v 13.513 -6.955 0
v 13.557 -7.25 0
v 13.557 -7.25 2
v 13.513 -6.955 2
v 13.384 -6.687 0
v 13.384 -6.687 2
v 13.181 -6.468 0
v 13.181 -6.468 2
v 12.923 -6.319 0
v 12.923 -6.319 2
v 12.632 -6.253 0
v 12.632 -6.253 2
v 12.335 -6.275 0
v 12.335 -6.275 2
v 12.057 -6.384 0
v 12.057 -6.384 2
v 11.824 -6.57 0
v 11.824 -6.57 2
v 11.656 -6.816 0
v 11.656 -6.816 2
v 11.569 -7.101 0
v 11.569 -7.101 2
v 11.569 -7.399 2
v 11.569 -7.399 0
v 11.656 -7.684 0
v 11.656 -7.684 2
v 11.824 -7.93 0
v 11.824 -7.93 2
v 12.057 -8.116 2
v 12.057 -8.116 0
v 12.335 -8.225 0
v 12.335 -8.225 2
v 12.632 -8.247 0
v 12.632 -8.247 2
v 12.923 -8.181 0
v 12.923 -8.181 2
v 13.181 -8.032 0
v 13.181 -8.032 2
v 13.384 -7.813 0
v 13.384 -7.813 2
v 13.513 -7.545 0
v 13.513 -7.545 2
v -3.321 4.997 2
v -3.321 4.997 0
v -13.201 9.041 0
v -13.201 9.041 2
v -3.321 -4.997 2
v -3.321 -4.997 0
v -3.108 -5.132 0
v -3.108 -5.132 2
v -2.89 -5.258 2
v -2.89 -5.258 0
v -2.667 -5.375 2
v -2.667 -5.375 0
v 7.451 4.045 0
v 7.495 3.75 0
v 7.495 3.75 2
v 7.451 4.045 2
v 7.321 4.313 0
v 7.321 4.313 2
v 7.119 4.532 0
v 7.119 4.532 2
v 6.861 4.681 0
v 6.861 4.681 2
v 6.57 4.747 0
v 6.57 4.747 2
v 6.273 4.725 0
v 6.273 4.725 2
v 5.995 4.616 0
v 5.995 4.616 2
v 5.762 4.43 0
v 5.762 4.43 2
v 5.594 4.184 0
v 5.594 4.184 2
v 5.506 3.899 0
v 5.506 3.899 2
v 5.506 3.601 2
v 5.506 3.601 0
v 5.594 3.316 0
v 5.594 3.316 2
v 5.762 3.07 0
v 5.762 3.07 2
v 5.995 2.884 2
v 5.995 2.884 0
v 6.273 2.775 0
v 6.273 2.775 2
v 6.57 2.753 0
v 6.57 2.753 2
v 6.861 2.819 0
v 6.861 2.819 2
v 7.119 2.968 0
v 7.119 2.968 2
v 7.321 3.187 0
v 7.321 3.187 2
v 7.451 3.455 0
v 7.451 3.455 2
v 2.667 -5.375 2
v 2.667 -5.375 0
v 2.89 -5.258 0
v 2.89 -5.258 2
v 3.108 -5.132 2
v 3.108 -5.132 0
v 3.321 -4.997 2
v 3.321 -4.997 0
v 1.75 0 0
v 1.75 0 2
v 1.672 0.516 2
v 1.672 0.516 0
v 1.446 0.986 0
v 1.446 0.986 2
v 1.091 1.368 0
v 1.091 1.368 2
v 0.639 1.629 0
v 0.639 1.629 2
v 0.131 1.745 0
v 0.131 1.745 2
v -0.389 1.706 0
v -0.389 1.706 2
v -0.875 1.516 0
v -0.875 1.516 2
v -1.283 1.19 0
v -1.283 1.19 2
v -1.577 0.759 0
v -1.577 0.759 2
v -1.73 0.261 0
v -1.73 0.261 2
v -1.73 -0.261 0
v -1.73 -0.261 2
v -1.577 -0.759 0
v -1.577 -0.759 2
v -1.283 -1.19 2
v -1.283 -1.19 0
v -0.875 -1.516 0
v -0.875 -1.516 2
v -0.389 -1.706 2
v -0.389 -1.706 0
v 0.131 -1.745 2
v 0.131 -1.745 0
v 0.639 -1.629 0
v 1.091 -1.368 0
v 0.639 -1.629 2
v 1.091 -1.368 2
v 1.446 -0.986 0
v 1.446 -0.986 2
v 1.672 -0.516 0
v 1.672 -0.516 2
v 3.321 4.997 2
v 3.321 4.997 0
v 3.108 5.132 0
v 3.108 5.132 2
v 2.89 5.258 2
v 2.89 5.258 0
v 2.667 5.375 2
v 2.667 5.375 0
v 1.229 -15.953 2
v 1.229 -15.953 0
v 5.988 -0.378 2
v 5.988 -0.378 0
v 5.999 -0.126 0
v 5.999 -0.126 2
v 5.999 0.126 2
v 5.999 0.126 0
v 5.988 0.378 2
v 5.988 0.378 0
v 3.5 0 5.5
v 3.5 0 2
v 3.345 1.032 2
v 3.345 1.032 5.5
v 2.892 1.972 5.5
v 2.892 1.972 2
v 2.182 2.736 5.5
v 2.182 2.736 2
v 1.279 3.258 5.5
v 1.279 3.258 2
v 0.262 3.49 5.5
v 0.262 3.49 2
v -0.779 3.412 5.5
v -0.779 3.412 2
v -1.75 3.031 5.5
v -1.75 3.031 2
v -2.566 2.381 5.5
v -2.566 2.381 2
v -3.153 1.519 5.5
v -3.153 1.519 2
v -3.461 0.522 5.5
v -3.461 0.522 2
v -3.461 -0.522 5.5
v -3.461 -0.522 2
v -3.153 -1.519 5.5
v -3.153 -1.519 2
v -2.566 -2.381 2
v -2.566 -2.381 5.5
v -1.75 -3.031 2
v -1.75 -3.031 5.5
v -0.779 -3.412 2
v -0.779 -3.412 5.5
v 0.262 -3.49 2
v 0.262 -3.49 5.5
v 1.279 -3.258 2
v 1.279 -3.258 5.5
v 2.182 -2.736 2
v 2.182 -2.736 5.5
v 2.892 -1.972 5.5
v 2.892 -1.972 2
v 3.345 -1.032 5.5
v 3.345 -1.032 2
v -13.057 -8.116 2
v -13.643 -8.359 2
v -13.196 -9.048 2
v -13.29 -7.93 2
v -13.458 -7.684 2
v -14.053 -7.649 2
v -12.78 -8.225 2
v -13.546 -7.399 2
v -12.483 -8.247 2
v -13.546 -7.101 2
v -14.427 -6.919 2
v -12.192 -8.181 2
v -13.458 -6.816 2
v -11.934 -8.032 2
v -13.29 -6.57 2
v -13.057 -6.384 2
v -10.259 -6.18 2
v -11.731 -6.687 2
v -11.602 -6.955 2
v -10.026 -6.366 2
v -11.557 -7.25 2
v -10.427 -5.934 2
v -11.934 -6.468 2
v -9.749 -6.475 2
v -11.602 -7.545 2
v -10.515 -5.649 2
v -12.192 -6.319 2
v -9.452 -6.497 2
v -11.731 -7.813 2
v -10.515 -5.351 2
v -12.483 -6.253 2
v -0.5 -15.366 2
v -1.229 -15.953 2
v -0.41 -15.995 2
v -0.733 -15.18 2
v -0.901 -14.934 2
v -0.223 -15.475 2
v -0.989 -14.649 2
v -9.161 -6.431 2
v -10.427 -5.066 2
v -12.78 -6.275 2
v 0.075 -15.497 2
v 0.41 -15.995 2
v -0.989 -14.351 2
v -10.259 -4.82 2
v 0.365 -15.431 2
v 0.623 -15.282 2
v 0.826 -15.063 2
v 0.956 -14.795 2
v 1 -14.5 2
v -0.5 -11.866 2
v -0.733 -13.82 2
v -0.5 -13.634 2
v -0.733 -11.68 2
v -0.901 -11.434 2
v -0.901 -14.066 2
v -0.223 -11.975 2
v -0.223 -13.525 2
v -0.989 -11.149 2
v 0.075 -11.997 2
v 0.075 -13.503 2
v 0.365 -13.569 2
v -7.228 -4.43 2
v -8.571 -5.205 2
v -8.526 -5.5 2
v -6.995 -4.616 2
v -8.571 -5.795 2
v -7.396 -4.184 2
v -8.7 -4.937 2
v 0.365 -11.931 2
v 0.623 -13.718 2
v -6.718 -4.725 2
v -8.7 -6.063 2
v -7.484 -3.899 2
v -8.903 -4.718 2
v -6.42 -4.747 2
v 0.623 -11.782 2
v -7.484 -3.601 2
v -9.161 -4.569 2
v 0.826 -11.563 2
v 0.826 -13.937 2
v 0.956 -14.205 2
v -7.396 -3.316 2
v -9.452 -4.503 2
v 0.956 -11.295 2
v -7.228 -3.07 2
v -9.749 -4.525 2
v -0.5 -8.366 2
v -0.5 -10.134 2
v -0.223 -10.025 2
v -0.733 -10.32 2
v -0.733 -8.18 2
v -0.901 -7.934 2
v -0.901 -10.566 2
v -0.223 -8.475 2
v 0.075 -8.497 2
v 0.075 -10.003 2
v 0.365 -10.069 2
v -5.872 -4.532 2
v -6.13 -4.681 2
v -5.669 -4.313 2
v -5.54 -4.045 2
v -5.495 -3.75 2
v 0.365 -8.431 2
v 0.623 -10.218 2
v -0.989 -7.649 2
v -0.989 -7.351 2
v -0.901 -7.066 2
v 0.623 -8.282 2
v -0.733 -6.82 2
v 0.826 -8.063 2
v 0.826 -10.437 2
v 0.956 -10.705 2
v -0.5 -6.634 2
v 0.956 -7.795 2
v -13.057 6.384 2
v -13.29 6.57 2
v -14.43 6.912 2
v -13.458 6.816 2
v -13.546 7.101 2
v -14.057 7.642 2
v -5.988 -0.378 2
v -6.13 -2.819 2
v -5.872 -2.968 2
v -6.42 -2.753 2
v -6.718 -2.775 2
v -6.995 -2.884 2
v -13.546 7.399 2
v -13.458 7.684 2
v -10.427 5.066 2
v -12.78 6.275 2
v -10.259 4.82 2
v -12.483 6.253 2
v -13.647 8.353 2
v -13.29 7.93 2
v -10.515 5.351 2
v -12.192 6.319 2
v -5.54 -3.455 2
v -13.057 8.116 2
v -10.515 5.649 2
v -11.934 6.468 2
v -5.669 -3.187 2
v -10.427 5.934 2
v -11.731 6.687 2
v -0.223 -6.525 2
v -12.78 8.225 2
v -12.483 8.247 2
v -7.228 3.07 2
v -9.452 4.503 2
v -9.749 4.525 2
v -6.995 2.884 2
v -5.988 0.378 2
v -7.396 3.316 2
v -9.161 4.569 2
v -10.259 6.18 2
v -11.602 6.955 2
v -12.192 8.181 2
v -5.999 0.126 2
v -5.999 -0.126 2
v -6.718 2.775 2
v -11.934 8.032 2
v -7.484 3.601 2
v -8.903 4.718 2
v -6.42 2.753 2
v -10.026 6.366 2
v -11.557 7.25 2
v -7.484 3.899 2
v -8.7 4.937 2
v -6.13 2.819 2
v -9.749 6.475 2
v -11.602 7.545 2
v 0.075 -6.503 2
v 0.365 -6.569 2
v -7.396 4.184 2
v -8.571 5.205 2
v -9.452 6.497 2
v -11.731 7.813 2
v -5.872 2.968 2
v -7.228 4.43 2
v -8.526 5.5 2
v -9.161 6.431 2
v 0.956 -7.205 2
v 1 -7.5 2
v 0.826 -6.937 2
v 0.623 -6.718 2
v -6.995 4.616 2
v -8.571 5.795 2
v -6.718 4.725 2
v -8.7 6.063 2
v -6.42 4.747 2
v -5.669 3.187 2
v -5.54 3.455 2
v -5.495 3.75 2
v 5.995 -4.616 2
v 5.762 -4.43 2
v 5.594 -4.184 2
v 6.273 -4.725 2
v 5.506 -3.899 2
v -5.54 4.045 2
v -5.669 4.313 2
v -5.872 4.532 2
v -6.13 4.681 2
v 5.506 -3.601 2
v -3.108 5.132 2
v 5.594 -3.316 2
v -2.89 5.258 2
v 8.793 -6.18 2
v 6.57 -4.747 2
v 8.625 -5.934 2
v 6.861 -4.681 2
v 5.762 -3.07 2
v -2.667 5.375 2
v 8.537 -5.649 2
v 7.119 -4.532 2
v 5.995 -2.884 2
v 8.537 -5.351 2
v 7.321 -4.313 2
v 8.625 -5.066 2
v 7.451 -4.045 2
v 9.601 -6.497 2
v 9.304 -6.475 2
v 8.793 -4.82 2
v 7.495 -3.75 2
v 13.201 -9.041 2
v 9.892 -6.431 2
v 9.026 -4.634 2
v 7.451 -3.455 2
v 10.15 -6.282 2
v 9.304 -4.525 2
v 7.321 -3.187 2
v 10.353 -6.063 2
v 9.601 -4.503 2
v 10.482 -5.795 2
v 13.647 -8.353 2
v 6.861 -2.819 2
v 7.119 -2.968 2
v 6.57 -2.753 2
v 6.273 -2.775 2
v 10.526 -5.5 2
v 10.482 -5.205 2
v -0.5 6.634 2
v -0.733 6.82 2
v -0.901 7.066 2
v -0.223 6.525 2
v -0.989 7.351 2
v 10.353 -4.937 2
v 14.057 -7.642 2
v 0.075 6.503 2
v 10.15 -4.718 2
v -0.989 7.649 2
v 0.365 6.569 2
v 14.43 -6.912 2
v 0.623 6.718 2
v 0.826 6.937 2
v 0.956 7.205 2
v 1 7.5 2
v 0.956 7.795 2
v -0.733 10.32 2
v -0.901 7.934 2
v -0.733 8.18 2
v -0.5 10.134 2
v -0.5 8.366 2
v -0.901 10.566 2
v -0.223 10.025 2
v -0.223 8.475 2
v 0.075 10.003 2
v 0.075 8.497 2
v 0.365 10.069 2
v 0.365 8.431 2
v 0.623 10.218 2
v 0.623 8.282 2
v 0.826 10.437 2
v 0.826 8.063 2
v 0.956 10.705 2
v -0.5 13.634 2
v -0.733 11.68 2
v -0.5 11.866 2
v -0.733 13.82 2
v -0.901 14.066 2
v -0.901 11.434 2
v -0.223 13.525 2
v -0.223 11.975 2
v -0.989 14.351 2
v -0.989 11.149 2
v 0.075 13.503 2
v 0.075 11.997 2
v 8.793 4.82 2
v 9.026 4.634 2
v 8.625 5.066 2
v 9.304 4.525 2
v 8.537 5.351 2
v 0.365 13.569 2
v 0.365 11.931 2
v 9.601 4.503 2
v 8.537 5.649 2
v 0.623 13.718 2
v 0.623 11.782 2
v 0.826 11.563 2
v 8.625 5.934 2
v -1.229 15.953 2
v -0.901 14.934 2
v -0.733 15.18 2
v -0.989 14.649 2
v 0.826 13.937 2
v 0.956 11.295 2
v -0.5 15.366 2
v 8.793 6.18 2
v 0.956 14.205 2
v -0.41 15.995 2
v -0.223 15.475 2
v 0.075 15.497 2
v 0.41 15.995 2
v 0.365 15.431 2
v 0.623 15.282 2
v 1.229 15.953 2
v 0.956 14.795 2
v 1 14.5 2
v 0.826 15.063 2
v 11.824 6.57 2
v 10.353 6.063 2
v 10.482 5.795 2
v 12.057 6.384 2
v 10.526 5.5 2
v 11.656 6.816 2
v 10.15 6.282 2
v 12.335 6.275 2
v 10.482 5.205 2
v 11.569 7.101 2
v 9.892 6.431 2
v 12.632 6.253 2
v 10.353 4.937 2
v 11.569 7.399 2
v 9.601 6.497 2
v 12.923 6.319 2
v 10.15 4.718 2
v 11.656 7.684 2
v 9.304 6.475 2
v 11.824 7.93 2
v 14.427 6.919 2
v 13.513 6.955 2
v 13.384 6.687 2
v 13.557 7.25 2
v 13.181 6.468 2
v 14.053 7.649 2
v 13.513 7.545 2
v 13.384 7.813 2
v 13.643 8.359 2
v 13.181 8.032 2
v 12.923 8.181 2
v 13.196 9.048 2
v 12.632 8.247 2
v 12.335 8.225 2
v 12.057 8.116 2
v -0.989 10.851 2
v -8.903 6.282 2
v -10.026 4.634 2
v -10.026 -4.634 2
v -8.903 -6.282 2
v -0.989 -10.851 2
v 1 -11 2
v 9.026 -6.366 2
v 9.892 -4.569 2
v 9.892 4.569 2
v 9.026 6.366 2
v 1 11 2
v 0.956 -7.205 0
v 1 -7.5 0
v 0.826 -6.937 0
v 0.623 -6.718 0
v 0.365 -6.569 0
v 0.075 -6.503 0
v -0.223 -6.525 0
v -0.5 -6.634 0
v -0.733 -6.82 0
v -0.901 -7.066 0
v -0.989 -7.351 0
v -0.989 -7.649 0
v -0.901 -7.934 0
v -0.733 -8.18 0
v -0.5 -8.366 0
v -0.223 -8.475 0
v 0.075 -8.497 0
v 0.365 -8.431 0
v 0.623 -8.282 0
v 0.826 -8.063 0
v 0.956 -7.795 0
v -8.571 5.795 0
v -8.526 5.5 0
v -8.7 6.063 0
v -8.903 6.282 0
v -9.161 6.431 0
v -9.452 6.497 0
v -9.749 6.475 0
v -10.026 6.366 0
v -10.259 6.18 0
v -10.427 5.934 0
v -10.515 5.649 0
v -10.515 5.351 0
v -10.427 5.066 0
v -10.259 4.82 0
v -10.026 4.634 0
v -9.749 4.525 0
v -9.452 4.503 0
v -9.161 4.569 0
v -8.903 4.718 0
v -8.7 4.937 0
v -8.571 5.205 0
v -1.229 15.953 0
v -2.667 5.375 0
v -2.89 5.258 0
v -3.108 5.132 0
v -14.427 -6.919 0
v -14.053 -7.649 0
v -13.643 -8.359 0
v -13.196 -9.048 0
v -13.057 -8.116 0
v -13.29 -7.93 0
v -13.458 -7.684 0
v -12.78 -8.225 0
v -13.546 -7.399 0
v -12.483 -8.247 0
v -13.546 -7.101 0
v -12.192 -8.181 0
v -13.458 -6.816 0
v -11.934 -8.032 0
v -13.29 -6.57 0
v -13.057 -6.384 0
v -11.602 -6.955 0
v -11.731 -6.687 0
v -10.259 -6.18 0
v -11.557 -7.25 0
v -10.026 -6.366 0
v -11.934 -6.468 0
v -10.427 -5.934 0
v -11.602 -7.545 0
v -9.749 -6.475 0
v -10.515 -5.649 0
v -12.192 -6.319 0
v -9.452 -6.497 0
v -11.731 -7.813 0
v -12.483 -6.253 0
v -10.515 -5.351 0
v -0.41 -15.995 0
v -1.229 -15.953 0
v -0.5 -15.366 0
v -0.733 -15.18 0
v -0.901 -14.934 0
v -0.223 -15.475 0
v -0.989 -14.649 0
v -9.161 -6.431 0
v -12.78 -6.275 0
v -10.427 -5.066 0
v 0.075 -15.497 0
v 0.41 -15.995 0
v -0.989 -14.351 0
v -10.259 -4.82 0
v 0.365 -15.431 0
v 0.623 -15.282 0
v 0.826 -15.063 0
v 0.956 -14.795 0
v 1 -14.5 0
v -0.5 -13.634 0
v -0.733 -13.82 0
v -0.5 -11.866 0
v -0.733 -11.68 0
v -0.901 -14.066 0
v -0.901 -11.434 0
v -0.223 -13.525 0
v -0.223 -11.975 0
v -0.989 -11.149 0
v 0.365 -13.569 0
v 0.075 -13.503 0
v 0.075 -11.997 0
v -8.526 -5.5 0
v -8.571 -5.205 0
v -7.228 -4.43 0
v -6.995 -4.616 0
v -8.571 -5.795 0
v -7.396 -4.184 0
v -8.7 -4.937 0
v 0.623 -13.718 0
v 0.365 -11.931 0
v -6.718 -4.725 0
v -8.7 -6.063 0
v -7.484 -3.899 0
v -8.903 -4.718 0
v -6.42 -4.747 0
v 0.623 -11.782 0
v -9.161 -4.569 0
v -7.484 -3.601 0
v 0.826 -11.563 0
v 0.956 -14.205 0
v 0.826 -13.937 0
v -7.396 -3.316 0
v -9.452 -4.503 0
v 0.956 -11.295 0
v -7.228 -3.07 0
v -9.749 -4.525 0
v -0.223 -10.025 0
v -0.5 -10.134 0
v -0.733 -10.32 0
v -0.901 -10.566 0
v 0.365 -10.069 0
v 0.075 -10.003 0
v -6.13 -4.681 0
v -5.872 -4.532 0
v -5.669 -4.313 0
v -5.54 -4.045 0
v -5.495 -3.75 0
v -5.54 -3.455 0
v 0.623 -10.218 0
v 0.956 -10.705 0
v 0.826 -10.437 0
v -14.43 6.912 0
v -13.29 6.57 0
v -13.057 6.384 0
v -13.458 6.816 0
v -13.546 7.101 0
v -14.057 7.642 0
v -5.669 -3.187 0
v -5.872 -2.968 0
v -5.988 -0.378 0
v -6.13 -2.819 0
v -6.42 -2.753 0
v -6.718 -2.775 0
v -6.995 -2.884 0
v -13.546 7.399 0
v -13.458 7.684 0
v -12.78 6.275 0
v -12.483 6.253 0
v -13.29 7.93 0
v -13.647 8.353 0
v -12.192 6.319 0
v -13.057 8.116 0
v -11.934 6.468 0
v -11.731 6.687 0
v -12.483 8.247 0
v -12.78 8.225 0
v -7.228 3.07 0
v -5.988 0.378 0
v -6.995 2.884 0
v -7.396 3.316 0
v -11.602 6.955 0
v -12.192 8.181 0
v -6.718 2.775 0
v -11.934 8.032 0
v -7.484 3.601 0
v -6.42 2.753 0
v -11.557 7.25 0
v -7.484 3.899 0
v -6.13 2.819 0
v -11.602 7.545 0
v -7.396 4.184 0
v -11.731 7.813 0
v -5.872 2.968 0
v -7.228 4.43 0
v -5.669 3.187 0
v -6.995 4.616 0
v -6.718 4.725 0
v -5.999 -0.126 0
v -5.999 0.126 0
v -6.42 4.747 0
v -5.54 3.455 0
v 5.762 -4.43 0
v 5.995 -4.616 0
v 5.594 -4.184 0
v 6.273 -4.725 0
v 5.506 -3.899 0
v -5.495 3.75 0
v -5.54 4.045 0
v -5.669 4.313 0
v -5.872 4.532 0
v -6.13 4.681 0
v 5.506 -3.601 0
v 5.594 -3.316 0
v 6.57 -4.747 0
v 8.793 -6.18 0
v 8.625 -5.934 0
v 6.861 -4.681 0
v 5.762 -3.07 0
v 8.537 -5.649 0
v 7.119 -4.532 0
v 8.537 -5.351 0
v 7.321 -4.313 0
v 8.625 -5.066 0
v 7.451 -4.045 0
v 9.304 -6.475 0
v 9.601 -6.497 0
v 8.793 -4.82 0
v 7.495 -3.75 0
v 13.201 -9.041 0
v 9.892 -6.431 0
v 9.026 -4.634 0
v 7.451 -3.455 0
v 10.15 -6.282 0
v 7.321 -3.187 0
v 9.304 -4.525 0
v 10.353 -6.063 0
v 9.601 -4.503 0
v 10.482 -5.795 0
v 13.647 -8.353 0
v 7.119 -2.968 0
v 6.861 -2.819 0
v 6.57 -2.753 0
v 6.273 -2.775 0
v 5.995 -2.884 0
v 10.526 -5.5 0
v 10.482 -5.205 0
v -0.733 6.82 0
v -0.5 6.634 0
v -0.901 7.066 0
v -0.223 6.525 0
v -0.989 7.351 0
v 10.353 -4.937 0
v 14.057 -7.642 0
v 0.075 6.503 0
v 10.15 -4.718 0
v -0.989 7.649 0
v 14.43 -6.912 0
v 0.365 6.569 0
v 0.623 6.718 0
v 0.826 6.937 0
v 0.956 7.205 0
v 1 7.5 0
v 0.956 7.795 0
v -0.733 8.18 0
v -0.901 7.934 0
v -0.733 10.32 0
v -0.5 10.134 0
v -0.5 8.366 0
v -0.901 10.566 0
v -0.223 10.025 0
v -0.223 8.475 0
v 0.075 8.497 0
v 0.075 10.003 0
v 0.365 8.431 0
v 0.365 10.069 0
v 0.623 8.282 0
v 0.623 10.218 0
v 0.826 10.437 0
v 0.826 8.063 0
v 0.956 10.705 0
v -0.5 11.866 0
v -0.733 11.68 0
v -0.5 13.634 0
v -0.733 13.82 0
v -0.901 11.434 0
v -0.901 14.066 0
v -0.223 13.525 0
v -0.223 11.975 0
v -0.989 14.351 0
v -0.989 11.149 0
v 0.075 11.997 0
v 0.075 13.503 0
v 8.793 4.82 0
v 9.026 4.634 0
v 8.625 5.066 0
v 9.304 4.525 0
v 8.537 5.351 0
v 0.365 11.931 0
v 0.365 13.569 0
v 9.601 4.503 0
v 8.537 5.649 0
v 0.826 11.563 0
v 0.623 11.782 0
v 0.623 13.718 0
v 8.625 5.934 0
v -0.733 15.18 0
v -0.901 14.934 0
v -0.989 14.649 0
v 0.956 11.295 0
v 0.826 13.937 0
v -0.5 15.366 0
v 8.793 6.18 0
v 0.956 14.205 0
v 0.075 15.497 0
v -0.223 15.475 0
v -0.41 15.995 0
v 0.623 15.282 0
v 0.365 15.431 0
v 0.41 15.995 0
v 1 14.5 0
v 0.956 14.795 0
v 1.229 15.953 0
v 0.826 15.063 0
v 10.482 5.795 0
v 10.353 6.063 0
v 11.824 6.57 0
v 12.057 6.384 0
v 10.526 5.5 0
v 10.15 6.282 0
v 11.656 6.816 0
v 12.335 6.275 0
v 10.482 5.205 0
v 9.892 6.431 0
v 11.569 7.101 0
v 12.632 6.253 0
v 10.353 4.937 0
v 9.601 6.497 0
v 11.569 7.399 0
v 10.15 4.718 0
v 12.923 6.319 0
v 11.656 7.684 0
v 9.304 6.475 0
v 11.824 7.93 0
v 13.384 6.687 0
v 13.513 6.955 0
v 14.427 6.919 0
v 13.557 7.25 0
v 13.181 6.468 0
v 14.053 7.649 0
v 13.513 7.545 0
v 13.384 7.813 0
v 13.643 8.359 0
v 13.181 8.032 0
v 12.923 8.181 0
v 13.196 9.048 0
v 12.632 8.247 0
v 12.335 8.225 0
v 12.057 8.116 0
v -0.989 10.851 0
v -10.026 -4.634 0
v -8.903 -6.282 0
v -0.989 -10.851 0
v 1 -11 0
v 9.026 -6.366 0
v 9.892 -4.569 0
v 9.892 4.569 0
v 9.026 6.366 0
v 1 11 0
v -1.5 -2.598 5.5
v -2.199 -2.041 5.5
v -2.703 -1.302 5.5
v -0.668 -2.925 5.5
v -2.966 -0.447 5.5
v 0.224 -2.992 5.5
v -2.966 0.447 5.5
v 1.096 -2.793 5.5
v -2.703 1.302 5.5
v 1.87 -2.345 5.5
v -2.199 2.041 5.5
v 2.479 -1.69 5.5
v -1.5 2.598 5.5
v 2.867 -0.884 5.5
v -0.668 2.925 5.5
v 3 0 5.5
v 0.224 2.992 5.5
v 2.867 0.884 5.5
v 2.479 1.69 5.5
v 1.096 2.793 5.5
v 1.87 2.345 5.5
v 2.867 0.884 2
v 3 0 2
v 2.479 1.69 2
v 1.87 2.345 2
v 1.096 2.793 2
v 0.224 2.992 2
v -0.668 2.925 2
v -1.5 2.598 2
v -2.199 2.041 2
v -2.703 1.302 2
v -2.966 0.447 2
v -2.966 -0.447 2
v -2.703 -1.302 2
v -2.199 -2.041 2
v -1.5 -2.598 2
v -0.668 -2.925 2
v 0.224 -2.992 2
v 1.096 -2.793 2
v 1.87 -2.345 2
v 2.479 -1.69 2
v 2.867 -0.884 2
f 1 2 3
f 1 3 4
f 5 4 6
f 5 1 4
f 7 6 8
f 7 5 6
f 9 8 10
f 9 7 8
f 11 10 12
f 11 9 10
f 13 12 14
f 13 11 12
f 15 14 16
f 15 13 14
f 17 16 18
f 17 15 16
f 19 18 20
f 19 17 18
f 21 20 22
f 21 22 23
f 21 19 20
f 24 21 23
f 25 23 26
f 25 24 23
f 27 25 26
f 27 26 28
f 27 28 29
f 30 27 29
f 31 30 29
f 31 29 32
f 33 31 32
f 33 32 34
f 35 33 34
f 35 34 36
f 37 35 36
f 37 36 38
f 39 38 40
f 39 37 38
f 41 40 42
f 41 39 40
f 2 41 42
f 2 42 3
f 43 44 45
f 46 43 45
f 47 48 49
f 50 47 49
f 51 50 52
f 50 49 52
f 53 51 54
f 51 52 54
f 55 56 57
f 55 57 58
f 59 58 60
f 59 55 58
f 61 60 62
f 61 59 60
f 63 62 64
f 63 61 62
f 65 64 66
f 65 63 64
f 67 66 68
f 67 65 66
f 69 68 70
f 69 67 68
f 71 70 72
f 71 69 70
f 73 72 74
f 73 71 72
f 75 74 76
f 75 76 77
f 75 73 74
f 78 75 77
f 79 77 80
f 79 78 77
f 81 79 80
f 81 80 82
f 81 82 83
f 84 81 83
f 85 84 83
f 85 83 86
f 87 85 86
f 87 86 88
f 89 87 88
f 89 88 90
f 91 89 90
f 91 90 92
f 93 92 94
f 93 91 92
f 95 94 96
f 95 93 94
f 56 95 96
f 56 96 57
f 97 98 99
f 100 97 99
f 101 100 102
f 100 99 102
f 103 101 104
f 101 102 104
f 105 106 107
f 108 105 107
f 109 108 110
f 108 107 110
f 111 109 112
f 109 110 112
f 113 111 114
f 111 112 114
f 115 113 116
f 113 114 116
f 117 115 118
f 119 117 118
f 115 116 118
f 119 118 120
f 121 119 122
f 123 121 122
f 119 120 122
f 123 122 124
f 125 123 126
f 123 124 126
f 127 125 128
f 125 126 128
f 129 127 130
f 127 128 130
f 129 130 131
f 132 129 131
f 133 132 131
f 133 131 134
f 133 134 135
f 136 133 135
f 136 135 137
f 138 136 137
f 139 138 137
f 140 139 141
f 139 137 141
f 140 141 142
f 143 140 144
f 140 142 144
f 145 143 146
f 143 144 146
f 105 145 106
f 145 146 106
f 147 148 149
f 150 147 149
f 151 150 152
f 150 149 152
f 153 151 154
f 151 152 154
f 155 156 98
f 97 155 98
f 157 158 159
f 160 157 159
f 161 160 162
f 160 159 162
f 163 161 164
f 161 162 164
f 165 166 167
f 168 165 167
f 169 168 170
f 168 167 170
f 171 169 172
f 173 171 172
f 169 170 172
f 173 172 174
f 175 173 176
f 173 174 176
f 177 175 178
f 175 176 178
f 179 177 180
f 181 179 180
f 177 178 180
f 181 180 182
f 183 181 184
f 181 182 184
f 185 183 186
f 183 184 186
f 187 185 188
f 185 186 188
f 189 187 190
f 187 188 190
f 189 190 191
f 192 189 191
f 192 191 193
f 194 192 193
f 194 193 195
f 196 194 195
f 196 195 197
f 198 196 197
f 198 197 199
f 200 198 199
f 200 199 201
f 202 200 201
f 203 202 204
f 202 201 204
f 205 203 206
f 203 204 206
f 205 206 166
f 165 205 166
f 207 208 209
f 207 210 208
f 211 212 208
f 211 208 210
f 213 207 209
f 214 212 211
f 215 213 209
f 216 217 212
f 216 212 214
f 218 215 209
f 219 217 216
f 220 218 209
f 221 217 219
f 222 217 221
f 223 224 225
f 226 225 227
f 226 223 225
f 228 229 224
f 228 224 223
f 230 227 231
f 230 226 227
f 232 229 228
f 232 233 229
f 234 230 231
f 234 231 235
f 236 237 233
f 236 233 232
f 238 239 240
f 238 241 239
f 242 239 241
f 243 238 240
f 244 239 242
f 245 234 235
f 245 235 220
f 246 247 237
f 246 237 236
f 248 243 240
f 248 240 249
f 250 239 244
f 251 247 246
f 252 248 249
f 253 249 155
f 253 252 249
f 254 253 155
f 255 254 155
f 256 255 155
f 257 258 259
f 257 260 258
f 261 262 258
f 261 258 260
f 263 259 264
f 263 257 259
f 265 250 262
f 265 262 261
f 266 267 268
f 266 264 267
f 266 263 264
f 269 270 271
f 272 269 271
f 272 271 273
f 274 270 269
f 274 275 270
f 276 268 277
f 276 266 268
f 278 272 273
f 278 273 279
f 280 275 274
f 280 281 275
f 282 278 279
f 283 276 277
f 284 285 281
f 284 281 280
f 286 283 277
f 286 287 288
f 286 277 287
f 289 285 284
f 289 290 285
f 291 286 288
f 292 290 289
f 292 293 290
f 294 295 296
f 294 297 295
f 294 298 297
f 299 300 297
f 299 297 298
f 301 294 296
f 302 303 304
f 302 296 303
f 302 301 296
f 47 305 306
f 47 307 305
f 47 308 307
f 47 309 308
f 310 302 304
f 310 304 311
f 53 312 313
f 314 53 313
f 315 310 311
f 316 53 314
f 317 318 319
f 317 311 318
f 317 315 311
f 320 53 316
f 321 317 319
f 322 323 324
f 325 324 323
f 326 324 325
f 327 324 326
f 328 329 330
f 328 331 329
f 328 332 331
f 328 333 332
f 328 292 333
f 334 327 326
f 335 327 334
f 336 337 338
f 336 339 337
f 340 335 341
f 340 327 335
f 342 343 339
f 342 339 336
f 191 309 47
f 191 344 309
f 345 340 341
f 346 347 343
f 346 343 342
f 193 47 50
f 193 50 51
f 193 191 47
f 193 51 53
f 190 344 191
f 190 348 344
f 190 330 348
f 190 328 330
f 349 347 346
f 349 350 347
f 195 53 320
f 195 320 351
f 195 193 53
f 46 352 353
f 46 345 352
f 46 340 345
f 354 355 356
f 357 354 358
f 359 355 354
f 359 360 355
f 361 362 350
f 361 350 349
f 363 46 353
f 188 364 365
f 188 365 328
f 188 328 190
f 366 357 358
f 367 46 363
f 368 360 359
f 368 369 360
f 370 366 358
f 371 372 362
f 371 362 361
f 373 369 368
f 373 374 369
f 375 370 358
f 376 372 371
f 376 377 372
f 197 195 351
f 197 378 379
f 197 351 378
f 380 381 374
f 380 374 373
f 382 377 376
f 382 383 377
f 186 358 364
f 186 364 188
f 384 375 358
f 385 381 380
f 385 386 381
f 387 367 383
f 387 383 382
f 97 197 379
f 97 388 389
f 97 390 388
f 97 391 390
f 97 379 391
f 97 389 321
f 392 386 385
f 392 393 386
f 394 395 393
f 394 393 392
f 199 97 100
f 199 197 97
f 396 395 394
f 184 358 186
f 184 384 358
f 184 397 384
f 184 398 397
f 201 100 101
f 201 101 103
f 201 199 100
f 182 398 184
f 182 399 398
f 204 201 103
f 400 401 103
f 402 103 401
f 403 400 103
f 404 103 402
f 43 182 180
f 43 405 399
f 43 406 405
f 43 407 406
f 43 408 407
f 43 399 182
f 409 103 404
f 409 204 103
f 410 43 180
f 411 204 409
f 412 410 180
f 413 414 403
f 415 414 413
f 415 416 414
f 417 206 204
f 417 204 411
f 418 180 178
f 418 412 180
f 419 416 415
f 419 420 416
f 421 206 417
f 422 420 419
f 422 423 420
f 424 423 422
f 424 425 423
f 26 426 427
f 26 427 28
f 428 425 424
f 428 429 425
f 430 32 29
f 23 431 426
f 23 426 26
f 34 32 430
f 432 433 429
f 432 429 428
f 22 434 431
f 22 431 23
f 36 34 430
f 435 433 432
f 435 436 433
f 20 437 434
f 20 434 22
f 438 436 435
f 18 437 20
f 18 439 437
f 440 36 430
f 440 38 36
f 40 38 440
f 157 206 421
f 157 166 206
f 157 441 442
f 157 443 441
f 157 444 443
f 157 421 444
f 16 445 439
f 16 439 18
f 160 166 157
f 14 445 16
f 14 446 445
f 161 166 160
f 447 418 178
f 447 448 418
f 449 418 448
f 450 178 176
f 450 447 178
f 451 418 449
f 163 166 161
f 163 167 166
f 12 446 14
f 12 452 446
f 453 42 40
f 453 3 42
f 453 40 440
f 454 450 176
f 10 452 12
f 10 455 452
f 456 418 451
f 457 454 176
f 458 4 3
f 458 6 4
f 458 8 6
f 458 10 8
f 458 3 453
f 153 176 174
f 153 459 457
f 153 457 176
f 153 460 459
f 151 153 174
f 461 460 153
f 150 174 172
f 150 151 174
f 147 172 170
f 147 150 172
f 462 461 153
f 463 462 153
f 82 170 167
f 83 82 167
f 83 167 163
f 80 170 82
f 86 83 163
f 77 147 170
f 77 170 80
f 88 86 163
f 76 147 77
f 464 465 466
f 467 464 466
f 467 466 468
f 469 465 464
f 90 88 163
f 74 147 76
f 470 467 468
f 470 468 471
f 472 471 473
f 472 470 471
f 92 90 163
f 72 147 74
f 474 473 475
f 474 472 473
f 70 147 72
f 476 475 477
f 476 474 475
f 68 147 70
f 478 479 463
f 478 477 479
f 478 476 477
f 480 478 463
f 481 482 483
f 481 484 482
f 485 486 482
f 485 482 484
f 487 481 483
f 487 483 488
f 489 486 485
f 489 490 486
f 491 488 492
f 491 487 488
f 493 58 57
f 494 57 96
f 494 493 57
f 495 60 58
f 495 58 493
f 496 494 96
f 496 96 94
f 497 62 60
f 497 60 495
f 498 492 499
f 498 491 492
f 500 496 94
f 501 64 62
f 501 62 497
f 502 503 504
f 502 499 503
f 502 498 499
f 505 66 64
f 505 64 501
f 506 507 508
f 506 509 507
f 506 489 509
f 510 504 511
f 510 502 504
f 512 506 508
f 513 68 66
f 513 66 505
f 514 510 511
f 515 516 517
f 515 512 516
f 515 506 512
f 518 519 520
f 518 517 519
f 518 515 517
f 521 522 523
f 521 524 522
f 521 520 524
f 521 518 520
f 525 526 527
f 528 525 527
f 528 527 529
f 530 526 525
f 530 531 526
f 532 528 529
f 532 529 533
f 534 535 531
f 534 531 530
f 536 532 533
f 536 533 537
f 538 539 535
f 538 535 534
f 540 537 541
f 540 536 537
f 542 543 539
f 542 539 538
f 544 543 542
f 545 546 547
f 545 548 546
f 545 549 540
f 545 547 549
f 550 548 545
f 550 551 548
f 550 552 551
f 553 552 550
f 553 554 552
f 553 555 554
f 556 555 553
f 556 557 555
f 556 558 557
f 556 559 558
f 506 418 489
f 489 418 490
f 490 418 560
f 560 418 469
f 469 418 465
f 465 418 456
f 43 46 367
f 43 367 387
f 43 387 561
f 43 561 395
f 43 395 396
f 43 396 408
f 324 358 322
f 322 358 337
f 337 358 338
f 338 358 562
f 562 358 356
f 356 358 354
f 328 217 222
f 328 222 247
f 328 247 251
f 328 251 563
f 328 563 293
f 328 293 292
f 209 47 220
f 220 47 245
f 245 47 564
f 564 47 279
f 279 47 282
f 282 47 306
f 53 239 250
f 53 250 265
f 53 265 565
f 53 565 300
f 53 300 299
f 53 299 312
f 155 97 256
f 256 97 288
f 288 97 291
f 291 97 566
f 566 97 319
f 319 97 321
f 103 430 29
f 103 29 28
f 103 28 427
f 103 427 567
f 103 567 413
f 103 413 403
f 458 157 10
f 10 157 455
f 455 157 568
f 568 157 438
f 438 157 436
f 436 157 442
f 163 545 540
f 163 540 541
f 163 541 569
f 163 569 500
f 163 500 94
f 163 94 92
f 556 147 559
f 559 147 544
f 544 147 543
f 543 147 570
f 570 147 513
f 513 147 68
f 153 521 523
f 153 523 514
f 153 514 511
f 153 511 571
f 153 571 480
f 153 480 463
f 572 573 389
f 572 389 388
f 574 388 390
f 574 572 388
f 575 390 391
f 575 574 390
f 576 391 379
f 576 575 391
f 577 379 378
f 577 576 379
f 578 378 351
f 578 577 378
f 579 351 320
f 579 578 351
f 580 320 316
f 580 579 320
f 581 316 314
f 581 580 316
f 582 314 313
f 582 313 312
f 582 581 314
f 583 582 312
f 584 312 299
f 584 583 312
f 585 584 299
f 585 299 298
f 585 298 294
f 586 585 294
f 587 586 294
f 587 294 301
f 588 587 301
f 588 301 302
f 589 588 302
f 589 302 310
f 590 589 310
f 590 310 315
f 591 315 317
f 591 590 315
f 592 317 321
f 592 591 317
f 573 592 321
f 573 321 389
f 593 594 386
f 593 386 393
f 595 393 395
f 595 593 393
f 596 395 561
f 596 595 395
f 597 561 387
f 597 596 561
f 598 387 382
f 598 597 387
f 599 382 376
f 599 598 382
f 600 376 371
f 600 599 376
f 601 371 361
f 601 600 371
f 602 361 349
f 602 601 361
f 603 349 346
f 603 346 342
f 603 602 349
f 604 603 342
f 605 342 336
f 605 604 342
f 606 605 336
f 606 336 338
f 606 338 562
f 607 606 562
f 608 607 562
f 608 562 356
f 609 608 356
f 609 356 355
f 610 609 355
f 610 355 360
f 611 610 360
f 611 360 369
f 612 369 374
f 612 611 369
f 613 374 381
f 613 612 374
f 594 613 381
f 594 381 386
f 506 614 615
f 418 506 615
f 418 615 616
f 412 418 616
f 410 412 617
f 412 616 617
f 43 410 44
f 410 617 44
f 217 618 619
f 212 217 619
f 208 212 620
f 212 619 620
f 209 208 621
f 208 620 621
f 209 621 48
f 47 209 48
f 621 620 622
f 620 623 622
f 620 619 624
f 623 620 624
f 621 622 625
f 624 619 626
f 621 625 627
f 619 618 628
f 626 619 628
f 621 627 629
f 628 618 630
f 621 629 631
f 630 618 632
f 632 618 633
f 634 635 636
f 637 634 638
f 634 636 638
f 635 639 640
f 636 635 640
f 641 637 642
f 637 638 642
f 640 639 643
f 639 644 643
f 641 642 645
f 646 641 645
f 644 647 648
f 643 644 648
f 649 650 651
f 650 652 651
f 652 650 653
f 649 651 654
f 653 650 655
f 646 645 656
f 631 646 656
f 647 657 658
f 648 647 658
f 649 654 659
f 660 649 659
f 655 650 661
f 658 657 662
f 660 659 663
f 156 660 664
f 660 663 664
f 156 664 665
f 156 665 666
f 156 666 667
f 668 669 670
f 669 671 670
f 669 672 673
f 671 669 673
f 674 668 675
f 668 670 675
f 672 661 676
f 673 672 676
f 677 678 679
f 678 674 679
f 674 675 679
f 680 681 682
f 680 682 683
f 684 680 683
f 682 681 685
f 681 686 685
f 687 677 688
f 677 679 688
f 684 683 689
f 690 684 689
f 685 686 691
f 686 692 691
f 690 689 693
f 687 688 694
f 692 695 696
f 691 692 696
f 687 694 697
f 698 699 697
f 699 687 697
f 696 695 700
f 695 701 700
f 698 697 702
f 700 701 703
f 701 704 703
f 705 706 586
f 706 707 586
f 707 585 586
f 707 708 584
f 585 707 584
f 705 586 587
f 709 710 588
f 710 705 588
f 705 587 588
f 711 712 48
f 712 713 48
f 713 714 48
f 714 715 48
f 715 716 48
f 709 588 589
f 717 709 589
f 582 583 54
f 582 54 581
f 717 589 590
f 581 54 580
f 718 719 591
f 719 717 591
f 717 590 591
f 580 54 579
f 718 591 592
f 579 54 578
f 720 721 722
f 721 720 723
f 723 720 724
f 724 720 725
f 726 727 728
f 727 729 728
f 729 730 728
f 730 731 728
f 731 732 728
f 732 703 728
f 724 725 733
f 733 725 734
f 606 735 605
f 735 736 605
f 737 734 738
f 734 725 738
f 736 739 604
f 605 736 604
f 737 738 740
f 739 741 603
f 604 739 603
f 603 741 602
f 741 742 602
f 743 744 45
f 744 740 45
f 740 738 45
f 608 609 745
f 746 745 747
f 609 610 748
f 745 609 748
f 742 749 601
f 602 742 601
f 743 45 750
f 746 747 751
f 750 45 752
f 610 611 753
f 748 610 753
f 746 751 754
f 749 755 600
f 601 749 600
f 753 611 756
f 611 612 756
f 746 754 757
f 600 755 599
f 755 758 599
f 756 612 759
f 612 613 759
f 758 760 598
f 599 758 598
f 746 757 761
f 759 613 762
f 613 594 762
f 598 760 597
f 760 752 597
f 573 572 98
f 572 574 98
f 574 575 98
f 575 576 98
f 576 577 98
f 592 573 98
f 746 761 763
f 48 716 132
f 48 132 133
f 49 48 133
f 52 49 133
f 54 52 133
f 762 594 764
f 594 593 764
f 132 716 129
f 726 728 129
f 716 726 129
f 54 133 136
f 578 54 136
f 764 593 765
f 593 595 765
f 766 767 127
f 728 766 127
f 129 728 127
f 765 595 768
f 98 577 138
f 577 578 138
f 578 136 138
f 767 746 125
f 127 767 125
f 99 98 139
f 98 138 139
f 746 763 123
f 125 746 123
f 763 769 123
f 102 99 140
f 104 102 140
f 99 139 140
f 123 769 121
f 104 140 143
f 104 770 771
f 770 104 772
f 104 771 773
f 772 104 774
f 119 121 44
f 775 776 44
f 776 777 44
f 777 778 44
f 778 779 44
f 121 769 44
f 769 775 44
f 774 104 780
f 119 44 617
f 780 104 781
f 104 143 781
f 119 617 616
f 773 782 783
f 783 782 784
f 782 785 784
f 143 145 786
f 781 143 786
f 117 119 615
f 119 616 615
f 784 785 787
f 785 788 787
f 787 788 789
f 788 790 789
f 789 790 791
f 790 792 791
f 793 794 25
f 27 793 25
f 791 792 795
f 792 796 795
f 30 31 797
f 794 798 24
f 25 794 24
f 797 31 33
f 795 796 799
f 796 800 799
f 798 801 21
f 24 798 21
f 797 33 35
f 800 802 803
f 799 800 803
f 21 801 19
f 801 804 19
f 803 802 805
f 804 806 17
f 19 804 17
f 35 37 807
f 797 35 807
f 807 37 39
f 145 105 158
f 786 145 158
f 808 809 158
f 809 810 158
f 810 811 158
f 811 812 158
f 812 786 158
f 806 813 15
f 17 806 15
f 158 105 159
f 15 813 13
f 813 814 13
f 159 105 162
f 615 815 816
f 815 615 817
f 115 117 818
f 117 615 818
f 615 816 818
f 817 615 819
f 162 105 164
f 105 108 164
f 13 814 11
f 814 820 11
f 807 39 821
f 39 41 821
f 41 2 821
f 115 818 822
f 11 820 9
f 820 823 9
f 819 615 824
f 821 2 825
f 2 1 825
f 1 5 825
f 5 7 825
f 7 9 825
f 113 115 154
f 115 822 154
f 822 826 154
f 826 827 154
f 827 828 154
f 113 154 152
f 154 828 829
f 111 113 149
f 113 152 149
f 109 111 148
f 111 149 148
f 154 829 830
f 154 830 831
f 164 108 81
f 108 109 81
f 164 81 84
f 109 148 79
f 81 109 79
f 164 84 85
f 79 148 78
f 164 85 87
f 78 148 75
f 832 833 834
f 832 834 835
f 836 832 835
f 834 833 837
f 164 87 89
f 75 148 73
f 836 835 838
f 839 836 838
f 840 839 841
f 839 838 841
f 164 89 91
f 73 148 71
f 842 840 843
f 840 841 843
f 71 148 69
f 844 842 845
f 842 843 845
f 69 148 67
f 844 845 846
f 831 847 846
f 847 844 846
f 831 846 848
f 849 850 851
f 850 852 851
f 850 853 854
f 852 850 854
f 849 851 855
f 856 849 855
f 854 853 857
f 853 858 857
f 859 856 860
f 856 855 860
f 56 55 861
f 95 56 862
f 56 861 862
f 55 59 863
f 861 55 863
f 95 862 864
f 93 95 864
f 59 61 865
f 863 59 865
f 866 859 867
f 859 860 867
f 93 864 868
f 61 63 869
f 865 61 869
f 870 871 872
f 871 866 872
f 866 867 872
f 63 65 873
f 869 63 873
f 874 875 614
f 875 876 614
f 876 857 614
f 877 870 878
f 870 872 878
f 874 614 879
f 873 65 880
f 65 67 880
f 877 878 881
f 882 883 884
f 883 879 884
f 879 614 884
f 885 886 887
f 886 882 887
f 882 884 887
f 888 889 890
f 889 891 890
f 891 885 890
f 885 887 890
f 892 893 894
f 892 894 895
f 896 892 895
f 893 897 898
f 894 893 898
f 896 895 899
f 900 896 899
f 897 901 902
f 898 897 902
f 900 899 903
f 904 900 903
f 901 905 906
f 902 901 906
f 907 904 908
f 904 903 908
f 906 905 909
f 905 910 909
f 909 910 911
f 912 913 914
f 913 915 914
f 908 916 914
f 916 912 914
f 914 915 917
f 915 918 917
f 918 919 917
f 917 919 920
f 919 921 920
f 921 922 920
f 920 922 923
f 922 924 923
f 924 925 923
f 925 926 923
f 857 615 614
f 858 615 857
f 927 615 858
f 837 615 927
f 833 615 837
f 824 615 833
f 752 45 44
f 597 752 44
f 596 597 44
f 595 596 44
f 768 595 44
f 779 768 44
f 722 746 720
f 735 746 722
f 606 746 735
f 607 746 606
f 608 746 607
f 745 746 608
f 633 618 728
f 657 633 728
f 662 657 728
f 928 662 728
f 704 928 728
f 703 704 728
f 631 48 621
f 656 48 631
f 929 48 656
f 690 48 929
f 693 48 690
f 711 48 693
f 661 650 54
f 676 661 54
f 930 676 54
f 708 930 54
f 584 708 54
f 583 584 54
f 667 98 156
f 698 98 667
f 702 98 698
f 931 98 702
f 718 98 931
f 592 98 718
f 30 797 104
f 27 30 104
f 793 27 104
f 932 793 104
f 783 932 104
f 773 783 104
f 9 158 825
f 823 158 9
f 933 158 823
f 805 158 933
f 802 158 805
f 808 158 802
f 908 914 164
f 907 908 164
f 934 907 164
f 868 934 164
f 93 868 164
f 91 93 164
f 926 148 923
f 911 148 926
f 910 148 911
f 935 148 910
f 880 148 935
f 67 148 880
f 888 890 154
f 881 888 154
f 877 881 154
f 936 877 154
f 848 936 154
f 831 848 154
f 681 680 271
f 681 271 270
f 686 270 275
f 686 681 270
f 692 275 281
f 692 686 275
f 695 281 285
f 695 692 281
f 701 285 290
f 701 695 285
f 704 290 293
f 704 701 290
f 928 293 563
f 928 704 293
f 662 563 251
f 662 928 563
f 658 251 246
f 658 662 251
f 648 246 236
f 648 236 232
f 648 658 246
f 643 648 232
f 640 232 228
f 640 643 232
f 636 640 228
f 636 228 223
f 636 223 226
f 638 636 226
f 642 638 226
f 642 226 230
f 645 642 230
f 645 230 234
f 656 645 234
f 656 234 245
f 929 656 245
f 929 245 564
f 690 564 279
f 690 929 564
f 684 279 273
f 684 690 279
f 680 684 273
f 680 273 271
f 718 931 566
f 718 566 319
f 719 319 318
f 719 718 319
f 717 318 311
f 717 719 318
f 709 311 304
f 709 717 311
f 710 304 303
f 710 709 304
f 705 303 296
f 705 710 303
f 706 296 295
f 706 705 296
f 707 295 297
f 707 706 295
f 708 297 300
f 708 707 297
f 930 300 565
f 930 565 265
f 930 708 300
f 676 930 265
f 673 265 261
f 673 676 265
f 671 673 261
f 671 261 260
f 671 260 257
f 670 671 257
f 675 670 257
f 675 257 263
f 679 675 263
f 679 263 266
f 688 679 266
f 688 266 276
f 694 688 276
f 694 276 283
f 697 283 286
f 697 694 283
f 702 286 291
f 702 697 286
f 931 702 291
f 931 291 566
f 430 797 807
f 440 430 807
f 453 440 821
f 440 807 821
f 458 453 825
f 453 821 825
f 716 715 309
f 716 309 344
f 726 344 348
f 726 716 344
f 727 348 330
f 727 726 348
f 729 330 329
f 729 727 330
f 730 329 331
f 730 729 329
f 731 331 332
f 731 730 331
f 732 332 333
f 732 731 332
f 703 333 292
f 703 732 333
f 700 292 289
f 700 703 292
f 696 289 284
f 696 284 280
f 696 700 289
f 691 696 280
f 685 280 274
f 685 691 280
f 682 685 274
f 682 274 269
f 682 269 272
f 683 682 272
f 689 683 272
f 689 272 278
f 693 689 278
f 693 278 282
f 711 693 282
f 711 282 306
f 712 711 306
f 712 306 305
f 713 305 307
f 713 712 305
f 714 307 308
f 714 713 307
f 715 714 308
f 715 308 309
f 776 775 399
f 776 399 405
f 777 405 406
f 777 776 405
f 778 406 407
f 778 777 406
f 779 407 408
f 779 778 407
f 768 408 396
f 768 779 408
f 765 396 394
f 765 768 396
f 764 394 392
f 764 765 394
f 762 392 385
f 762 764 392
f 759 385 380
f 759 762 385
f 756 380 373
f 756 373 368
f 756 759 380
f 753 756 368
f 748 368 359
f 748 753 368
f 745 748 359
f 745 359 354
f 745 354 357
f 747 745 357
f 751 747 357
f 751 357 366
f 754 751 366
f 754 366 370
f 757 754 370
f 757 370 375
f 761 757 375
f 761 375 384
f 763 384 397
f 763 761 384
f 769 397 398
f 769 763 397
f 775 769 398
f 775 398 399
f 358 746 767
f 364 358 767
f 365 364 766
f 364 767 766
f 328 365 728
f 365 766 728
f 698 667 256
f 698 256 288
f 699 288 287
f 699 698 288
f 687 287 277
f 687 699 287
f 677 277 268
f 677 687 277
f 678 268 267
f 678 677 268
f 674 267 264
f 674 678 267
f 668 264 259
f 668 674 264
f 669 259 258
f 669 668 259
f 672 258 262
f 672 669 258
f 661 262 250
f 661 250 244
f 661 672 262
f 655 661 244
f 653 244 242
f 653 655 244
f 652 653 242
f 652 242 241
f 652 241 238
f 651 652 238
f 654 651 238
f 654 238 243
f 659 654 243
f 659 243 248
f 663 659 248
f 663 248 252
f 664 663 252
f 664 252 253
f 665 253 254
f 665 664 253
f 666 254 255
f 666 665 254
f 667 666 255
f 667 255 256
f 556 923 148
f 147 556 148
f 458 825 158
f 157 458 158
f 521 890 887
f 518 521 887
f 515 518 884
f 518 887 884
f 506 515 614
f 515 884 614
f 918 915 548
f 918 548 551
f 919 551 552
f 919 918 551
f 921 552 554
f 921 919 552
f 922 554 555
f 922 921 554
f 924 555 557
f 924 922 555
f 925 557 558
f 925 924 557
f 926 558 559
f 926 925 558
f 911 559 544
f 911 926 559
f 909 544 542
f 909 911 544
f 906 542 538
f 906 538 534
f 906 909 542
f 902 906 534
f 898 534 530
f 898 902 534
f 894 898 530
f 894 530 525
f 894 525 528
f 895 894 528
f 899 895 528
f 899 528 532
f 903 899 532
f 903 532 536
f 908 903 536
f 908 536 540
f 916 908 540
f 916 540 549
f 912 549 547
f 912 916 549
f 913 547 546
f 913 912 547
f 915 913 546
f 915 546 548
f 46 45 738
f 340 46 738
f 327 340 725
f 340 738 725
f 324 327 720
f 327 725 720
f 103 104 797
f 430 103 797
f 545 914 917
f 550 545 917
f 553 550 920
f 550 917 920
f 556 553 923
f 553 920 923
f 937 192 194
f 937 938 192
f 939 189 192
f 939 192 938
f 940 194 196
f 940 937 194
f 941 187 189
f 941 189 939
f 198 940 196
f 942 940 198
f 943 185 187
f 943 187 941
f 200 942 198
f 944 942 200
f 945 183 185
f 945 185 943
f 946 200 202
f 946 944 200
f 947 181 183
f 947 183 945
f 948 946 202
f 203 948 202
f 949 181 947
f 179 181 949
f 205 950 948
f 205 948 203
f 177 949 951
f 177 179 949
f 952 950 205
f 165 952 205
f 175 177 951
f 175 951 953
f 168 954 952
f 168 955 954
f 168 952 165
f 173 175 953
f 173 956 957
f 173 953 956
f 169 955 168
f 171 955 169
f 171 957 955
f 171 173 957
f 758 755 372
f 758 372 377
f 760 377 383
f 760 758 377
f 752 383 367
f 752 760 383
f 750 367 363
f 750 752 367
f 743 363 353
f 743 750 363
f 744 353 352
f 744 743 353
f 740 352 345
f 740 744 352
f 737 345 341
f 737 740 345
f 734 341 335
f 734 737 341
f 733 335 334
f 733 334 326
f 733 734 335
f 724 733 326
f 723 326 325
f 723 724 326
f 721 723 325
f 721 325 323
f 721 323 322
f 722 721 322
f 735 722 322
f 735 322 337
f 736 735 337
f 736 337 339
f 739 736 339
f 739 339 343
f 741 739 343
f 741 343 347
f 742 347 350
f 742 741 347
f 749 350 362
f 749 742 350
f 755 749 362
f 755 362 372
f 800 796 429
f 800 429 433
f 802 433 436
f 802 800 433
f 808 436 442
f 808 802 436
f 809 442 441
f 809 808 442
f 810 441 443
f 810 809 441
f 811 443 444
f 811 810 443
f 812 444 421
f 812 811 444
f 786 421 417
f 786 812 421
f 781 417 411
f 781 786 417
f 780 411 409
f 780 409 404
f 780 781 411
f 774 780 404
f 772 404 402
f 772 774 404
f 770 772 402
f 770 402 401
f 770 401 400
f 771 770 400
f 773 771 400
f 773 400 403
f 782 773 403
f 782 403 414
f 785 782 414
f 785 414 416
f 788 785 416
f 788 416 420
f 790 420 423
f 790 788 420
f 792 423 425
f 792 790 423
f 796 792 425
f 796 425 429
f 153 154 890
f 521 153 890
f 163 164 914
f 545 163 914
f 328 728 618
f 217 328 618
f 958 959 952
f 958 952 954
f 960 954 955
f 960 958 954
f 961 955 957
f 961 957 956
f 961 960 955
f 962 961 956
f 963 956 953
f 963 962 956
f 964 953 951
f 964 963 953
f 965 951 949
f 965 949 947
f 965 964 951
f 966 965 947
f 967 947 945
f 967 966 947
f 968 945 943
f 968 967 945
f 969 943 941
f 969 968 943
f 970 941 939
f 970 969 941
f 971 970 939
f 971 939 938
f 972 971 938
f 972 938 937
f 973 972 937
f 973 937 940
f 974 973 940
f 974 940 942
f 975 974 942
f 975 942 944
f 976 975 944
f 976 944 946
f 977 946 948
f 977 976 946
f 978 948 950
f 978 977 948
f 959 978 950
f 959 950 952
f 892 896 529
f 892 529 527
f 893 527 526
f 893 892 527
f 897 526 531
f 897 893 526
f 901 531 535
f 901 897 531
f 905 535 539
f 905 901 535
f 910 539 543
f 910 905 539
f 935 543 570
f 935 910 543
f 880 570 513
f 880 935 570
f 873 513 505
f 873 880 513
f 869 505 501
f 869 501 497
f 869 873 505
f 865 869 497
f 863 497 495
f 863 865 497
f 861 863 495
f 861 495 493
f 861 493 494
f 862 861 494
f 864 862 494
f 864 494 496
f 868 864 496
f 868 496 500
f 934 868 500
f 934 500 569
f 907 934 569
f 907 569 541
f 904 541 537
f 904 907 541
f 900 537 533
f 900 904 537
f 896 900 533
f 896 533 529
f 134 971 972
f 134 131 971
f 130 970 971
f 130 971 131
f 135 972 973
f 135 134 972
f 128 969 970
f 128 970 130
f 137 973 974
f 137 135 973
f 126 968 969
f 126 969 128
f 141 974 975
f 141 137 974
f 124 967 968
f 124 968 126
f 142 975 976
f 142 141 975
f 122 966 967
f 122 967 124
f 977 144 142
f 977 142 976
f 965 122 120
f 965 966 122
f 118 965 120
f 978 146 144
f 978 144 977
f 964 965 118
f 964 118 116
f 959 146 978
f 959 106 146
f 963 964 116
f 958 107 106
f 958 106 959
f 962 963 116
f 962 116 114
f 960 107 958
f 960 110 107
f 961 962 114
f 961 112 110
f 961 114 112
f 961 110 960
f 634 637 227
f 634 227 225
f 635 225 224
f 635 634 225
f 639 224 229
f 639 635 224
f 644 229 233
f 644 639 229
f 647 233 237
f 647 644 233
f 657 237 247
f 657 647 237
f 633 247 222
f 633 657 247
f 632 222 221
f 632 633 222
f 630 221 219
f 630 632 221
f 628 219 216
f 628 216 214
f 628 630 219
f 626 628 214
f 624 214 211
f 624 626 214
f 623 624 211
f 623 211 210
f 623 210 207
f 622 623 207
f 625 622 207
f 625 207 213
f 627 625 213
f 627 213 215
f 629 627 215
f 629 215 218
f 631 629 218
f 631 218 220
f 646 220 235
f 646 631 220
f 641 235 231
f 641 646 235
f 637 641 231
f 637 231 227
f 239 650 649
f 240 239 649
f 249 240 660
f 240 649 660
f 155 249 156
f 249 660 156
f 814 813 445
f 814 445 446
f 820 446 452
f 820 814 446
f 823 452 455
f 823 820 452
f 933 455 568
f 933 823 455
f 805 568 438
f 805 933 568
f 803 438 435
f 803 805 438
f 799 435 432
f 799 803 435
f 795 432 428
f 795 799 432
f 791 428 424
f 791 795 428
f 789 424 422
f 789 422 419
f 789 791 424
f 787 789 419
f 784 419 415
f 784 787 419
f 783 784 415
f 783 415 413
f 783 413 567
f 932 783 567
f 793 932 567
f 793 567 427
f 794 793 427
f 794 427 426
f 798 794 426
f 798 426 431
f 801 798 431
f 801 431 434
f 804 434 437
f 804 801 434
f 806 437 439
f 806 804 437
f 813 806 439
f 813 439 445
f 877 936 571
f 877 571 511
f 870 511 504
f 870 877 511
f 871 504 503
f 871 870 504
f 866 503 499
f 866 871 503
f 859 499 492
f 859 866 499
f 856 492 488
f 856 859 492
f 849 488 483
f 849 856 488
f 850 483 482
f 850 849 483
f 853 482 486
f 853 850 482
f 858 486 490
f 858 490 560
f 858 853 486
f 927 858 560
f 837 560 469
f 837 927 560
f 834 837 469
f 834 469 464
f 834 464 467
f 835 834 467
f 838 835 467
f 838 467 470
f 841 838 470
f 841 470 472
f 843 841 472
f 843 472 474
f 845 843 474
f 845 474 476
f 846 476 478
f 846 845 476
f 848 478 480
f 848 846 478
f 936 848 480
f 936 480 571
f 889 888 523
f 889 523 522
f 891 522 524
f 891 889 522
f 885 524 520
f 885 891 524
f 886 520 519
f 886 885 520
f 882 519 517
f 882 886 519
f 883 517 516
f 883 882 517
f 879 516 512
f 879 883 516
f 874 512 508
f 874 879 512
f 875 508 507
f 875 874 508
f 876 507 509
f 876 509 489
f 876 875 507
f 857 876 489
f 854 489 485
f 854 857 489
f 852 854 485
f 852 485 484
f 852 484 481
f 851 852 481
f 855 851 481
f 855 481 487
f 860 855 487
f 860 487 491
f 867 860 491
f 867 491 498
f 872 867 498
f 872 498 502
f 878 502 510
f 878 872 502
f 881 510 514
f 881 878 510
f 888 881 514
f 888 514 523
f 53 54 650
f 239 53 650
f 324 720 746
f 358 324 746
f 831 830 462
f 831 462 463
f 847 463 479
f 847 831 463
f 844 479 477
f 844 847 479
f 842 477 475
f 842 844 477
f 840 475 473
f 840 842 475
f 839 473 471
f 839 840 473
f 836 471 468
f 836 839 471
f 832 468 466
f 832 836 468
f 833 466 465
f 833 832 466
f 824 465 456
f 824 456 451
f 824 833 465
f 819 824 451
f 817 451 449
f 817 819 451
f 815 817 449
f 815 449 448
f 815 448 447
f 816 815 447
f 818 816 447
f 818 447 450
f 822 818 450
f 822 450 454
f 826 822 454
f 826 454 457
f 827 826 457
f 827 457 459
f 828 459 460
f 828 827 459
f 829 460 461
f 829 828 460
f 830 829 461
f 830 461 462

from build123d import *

# Parameters (mm, degrees)
SKETCH1_R           = 1
BOSS_EXTRUDE3_DEPTH = 2
SKETCH2_R           = 1.75
CUT_EXTRUDE2_DEPTH  = 2
SKETCH3_R           = 3.5
SKETCH3_R_2         = 3
BOSS_EXTRUDE4_DEPTH = 3.5


with BuildPart() as part:
    # Sketch1 → Boss-Extrude3 (new body)
    with BuildSketch(Plane.XY):
        with BuildLine():
            ThreePointArc((1.229444159, 15.952694665), (0, 16), (-1.229444159, 15.952694665))
            Line((-1.229444159, 15.952694665), (-2.666890983, 5.374727201))
            ThreePointArc((-2.666890983, 5.374727201), (-3, 5.196152423), (-3.321204803, 4.996958941))
            Line((-3.321204803, 4.996958941), (-13.200716759, 9.041077207))
            ThreePointArc((-13.200716759, 9.041077207), (-13.856406461, 8), (-14.430160918, 6.911617458))
            Line((-14.430160918, 6.911617458), (-5.988095786, 0.37776826))
            ThreePointArc((-5.988095786, 0.37776826), (-5.999999995, -0.000251411), (-5.988064107, -0.378270083))
            Line((-5.988064107, -0.378270083), (-14.426795427, -6.918639585))
            ThreePointArc((-14.426795427, -6.918639585), (-13.85251149, -8.006742498), (-13.196315379, -9.04750023))
            Line((-13.196315379, -9.04750023), (-3.320786342, -4.997237044))
            ThreePointArc((-3.320786342, -4.997237044), (-2.999782432, -5.196278029), (-2.666890983, -5.374727201))
            Line((-2.666890983, -5.374727201), (-1.229444159, -15.952694665))
            ThreePointArc((-1.229444159, -15.952694665), (0, -16), (1.229444159, -15.952694665))
            Line((1.229444159, -15.952694665), (2.666890983, -5.374727201))
            ThreePointArc((2.666890983, -5.374727201), (3, -5.196152423), (3.321204803, -4.996958941))
            Line((3.321204803, -4.996958941), (13.200716759, -9.041077207))
            ThreePointArc((13.200716759, -9.041077207), (13.856406461, -8), (14.430160918, -6.911617458))
            Line((14.430160918, -6.911617458), (5.988095786, -0.37776826))
            ThreePointArc((5.988095786, -0.37776826), (5.999999995, 0.000251411), (5.988064107, 0.378270083))
            Line((5.988064107, 0.378270083), (14.426795427, 6.918639585))
            ThreePointArc((14.426795427, 6.918639585), (13.85251149, 8.006742498), (13.196315379, 9.04750023))
            Line((13.196315379, 9.04750023), (3.320786342, 4.997237044))
            ThreePointArc((3.320786342, 4.997237044), (2.999782432, 5.196278029), (2.666890983, 5.374727201))
            Line((2.666890983, 5.374727201), (1.229444159, 15.952694665))
        make_face()
        with Locations((0, 7.5)):
            Circle(SKETCH1_R, mode=Mode.SUBTRACT)
        with Locations((0, 11)):
            Circle(SKETCH1_R, mode=Mode.SUBTRACT)
        with Locations((0, 14.5)):
            Circle(SKETCH1_R, mode=Mode.SUBTRACT)
        with Locations((-6.495190528, 3.75)):
            Circle(SKETCH1_R, mode=Mode.SUBTRACT)
        with Locations((-12.557368355, 7.25)):
            Circle(SKETCH1_R, mode=Mode.SUBTRACT)
        with Locations((-9.526279442, 5.5)):
            Circle(SKETCH1_R, mode=Mode.SUBTRACT)
        with Locations((12.557368355, 7.25)):
            Circle(SKETCH1_R, mode=Mode.SUBTRACT)
        with Locations((6.495190528, 3.75)):
            Circle(SKETCH1_R, mode=Mode.SUBTRACT)
        with Locations((9.526279442, 5.5)):
            Circle(SKETCH1_R, mode=Mode.SUBTRACT)
        with Locations((-6.495190528, -3.75)):
            Circle(SKETCH1_R, mode=Mode.SUBTRACT)
        with Locations((-12.557368355, -7.25)):
            Circle(SKETCH1_R, mode=Mode.SUBTRACT)
        with Locations((-9.526279442, -5.5)):
            Circle(SKETCH1_R, mode=Mode.SUBTRACT)
        with Locations((12.557368355, -7.25)):
            Circle(SKETCH1_R, mode=Mode.SUBTRACT)
        with Locations((6.495190528, -3.75)):
            Circle(SKETCH1_R, mode=Mode.SUBTRACT)
        with Locations((9.526279442, -5.5)):
            Circle(SKETCH1_R, mode=Mode.SUBTRACT)
        with Locations((0, -7.5)):
            Circle(SKETCH1_R, mode=Mode.SUBTRACT)
        with Locations((0, -14.5)):
            Circle(SKETCH1_R, mode=Mode.SUBTRACT)
        with Locations((0, -11)):
            Circle(SKETCH1_R, mode=Mode.SUBTRACT)
    extrude(amount=BOSS_EXTRUDE3_DEPTH)

    # Sketch2 → Cut-Extrude2 (cut)
    with BuildSketch(Plane.XY.offset(2)):
        Circle(SKETCH2_R)
    extrude(amount=-CUT_EXTRUDE2_DEPTH, mode=Mode.SUBTRACT)

    # Sketch3 → Boss-Extrude4 (add)
    with BuildSketch(Plane.XY.offset(2)):
        Circle(SKETCH3_R)
        Circle(SKETCH3_R_2, mode=Mode.SUBTRACT)
    extrude(amount=BOSS_EXTRUDE4_DEPTH)


solid = part.part
